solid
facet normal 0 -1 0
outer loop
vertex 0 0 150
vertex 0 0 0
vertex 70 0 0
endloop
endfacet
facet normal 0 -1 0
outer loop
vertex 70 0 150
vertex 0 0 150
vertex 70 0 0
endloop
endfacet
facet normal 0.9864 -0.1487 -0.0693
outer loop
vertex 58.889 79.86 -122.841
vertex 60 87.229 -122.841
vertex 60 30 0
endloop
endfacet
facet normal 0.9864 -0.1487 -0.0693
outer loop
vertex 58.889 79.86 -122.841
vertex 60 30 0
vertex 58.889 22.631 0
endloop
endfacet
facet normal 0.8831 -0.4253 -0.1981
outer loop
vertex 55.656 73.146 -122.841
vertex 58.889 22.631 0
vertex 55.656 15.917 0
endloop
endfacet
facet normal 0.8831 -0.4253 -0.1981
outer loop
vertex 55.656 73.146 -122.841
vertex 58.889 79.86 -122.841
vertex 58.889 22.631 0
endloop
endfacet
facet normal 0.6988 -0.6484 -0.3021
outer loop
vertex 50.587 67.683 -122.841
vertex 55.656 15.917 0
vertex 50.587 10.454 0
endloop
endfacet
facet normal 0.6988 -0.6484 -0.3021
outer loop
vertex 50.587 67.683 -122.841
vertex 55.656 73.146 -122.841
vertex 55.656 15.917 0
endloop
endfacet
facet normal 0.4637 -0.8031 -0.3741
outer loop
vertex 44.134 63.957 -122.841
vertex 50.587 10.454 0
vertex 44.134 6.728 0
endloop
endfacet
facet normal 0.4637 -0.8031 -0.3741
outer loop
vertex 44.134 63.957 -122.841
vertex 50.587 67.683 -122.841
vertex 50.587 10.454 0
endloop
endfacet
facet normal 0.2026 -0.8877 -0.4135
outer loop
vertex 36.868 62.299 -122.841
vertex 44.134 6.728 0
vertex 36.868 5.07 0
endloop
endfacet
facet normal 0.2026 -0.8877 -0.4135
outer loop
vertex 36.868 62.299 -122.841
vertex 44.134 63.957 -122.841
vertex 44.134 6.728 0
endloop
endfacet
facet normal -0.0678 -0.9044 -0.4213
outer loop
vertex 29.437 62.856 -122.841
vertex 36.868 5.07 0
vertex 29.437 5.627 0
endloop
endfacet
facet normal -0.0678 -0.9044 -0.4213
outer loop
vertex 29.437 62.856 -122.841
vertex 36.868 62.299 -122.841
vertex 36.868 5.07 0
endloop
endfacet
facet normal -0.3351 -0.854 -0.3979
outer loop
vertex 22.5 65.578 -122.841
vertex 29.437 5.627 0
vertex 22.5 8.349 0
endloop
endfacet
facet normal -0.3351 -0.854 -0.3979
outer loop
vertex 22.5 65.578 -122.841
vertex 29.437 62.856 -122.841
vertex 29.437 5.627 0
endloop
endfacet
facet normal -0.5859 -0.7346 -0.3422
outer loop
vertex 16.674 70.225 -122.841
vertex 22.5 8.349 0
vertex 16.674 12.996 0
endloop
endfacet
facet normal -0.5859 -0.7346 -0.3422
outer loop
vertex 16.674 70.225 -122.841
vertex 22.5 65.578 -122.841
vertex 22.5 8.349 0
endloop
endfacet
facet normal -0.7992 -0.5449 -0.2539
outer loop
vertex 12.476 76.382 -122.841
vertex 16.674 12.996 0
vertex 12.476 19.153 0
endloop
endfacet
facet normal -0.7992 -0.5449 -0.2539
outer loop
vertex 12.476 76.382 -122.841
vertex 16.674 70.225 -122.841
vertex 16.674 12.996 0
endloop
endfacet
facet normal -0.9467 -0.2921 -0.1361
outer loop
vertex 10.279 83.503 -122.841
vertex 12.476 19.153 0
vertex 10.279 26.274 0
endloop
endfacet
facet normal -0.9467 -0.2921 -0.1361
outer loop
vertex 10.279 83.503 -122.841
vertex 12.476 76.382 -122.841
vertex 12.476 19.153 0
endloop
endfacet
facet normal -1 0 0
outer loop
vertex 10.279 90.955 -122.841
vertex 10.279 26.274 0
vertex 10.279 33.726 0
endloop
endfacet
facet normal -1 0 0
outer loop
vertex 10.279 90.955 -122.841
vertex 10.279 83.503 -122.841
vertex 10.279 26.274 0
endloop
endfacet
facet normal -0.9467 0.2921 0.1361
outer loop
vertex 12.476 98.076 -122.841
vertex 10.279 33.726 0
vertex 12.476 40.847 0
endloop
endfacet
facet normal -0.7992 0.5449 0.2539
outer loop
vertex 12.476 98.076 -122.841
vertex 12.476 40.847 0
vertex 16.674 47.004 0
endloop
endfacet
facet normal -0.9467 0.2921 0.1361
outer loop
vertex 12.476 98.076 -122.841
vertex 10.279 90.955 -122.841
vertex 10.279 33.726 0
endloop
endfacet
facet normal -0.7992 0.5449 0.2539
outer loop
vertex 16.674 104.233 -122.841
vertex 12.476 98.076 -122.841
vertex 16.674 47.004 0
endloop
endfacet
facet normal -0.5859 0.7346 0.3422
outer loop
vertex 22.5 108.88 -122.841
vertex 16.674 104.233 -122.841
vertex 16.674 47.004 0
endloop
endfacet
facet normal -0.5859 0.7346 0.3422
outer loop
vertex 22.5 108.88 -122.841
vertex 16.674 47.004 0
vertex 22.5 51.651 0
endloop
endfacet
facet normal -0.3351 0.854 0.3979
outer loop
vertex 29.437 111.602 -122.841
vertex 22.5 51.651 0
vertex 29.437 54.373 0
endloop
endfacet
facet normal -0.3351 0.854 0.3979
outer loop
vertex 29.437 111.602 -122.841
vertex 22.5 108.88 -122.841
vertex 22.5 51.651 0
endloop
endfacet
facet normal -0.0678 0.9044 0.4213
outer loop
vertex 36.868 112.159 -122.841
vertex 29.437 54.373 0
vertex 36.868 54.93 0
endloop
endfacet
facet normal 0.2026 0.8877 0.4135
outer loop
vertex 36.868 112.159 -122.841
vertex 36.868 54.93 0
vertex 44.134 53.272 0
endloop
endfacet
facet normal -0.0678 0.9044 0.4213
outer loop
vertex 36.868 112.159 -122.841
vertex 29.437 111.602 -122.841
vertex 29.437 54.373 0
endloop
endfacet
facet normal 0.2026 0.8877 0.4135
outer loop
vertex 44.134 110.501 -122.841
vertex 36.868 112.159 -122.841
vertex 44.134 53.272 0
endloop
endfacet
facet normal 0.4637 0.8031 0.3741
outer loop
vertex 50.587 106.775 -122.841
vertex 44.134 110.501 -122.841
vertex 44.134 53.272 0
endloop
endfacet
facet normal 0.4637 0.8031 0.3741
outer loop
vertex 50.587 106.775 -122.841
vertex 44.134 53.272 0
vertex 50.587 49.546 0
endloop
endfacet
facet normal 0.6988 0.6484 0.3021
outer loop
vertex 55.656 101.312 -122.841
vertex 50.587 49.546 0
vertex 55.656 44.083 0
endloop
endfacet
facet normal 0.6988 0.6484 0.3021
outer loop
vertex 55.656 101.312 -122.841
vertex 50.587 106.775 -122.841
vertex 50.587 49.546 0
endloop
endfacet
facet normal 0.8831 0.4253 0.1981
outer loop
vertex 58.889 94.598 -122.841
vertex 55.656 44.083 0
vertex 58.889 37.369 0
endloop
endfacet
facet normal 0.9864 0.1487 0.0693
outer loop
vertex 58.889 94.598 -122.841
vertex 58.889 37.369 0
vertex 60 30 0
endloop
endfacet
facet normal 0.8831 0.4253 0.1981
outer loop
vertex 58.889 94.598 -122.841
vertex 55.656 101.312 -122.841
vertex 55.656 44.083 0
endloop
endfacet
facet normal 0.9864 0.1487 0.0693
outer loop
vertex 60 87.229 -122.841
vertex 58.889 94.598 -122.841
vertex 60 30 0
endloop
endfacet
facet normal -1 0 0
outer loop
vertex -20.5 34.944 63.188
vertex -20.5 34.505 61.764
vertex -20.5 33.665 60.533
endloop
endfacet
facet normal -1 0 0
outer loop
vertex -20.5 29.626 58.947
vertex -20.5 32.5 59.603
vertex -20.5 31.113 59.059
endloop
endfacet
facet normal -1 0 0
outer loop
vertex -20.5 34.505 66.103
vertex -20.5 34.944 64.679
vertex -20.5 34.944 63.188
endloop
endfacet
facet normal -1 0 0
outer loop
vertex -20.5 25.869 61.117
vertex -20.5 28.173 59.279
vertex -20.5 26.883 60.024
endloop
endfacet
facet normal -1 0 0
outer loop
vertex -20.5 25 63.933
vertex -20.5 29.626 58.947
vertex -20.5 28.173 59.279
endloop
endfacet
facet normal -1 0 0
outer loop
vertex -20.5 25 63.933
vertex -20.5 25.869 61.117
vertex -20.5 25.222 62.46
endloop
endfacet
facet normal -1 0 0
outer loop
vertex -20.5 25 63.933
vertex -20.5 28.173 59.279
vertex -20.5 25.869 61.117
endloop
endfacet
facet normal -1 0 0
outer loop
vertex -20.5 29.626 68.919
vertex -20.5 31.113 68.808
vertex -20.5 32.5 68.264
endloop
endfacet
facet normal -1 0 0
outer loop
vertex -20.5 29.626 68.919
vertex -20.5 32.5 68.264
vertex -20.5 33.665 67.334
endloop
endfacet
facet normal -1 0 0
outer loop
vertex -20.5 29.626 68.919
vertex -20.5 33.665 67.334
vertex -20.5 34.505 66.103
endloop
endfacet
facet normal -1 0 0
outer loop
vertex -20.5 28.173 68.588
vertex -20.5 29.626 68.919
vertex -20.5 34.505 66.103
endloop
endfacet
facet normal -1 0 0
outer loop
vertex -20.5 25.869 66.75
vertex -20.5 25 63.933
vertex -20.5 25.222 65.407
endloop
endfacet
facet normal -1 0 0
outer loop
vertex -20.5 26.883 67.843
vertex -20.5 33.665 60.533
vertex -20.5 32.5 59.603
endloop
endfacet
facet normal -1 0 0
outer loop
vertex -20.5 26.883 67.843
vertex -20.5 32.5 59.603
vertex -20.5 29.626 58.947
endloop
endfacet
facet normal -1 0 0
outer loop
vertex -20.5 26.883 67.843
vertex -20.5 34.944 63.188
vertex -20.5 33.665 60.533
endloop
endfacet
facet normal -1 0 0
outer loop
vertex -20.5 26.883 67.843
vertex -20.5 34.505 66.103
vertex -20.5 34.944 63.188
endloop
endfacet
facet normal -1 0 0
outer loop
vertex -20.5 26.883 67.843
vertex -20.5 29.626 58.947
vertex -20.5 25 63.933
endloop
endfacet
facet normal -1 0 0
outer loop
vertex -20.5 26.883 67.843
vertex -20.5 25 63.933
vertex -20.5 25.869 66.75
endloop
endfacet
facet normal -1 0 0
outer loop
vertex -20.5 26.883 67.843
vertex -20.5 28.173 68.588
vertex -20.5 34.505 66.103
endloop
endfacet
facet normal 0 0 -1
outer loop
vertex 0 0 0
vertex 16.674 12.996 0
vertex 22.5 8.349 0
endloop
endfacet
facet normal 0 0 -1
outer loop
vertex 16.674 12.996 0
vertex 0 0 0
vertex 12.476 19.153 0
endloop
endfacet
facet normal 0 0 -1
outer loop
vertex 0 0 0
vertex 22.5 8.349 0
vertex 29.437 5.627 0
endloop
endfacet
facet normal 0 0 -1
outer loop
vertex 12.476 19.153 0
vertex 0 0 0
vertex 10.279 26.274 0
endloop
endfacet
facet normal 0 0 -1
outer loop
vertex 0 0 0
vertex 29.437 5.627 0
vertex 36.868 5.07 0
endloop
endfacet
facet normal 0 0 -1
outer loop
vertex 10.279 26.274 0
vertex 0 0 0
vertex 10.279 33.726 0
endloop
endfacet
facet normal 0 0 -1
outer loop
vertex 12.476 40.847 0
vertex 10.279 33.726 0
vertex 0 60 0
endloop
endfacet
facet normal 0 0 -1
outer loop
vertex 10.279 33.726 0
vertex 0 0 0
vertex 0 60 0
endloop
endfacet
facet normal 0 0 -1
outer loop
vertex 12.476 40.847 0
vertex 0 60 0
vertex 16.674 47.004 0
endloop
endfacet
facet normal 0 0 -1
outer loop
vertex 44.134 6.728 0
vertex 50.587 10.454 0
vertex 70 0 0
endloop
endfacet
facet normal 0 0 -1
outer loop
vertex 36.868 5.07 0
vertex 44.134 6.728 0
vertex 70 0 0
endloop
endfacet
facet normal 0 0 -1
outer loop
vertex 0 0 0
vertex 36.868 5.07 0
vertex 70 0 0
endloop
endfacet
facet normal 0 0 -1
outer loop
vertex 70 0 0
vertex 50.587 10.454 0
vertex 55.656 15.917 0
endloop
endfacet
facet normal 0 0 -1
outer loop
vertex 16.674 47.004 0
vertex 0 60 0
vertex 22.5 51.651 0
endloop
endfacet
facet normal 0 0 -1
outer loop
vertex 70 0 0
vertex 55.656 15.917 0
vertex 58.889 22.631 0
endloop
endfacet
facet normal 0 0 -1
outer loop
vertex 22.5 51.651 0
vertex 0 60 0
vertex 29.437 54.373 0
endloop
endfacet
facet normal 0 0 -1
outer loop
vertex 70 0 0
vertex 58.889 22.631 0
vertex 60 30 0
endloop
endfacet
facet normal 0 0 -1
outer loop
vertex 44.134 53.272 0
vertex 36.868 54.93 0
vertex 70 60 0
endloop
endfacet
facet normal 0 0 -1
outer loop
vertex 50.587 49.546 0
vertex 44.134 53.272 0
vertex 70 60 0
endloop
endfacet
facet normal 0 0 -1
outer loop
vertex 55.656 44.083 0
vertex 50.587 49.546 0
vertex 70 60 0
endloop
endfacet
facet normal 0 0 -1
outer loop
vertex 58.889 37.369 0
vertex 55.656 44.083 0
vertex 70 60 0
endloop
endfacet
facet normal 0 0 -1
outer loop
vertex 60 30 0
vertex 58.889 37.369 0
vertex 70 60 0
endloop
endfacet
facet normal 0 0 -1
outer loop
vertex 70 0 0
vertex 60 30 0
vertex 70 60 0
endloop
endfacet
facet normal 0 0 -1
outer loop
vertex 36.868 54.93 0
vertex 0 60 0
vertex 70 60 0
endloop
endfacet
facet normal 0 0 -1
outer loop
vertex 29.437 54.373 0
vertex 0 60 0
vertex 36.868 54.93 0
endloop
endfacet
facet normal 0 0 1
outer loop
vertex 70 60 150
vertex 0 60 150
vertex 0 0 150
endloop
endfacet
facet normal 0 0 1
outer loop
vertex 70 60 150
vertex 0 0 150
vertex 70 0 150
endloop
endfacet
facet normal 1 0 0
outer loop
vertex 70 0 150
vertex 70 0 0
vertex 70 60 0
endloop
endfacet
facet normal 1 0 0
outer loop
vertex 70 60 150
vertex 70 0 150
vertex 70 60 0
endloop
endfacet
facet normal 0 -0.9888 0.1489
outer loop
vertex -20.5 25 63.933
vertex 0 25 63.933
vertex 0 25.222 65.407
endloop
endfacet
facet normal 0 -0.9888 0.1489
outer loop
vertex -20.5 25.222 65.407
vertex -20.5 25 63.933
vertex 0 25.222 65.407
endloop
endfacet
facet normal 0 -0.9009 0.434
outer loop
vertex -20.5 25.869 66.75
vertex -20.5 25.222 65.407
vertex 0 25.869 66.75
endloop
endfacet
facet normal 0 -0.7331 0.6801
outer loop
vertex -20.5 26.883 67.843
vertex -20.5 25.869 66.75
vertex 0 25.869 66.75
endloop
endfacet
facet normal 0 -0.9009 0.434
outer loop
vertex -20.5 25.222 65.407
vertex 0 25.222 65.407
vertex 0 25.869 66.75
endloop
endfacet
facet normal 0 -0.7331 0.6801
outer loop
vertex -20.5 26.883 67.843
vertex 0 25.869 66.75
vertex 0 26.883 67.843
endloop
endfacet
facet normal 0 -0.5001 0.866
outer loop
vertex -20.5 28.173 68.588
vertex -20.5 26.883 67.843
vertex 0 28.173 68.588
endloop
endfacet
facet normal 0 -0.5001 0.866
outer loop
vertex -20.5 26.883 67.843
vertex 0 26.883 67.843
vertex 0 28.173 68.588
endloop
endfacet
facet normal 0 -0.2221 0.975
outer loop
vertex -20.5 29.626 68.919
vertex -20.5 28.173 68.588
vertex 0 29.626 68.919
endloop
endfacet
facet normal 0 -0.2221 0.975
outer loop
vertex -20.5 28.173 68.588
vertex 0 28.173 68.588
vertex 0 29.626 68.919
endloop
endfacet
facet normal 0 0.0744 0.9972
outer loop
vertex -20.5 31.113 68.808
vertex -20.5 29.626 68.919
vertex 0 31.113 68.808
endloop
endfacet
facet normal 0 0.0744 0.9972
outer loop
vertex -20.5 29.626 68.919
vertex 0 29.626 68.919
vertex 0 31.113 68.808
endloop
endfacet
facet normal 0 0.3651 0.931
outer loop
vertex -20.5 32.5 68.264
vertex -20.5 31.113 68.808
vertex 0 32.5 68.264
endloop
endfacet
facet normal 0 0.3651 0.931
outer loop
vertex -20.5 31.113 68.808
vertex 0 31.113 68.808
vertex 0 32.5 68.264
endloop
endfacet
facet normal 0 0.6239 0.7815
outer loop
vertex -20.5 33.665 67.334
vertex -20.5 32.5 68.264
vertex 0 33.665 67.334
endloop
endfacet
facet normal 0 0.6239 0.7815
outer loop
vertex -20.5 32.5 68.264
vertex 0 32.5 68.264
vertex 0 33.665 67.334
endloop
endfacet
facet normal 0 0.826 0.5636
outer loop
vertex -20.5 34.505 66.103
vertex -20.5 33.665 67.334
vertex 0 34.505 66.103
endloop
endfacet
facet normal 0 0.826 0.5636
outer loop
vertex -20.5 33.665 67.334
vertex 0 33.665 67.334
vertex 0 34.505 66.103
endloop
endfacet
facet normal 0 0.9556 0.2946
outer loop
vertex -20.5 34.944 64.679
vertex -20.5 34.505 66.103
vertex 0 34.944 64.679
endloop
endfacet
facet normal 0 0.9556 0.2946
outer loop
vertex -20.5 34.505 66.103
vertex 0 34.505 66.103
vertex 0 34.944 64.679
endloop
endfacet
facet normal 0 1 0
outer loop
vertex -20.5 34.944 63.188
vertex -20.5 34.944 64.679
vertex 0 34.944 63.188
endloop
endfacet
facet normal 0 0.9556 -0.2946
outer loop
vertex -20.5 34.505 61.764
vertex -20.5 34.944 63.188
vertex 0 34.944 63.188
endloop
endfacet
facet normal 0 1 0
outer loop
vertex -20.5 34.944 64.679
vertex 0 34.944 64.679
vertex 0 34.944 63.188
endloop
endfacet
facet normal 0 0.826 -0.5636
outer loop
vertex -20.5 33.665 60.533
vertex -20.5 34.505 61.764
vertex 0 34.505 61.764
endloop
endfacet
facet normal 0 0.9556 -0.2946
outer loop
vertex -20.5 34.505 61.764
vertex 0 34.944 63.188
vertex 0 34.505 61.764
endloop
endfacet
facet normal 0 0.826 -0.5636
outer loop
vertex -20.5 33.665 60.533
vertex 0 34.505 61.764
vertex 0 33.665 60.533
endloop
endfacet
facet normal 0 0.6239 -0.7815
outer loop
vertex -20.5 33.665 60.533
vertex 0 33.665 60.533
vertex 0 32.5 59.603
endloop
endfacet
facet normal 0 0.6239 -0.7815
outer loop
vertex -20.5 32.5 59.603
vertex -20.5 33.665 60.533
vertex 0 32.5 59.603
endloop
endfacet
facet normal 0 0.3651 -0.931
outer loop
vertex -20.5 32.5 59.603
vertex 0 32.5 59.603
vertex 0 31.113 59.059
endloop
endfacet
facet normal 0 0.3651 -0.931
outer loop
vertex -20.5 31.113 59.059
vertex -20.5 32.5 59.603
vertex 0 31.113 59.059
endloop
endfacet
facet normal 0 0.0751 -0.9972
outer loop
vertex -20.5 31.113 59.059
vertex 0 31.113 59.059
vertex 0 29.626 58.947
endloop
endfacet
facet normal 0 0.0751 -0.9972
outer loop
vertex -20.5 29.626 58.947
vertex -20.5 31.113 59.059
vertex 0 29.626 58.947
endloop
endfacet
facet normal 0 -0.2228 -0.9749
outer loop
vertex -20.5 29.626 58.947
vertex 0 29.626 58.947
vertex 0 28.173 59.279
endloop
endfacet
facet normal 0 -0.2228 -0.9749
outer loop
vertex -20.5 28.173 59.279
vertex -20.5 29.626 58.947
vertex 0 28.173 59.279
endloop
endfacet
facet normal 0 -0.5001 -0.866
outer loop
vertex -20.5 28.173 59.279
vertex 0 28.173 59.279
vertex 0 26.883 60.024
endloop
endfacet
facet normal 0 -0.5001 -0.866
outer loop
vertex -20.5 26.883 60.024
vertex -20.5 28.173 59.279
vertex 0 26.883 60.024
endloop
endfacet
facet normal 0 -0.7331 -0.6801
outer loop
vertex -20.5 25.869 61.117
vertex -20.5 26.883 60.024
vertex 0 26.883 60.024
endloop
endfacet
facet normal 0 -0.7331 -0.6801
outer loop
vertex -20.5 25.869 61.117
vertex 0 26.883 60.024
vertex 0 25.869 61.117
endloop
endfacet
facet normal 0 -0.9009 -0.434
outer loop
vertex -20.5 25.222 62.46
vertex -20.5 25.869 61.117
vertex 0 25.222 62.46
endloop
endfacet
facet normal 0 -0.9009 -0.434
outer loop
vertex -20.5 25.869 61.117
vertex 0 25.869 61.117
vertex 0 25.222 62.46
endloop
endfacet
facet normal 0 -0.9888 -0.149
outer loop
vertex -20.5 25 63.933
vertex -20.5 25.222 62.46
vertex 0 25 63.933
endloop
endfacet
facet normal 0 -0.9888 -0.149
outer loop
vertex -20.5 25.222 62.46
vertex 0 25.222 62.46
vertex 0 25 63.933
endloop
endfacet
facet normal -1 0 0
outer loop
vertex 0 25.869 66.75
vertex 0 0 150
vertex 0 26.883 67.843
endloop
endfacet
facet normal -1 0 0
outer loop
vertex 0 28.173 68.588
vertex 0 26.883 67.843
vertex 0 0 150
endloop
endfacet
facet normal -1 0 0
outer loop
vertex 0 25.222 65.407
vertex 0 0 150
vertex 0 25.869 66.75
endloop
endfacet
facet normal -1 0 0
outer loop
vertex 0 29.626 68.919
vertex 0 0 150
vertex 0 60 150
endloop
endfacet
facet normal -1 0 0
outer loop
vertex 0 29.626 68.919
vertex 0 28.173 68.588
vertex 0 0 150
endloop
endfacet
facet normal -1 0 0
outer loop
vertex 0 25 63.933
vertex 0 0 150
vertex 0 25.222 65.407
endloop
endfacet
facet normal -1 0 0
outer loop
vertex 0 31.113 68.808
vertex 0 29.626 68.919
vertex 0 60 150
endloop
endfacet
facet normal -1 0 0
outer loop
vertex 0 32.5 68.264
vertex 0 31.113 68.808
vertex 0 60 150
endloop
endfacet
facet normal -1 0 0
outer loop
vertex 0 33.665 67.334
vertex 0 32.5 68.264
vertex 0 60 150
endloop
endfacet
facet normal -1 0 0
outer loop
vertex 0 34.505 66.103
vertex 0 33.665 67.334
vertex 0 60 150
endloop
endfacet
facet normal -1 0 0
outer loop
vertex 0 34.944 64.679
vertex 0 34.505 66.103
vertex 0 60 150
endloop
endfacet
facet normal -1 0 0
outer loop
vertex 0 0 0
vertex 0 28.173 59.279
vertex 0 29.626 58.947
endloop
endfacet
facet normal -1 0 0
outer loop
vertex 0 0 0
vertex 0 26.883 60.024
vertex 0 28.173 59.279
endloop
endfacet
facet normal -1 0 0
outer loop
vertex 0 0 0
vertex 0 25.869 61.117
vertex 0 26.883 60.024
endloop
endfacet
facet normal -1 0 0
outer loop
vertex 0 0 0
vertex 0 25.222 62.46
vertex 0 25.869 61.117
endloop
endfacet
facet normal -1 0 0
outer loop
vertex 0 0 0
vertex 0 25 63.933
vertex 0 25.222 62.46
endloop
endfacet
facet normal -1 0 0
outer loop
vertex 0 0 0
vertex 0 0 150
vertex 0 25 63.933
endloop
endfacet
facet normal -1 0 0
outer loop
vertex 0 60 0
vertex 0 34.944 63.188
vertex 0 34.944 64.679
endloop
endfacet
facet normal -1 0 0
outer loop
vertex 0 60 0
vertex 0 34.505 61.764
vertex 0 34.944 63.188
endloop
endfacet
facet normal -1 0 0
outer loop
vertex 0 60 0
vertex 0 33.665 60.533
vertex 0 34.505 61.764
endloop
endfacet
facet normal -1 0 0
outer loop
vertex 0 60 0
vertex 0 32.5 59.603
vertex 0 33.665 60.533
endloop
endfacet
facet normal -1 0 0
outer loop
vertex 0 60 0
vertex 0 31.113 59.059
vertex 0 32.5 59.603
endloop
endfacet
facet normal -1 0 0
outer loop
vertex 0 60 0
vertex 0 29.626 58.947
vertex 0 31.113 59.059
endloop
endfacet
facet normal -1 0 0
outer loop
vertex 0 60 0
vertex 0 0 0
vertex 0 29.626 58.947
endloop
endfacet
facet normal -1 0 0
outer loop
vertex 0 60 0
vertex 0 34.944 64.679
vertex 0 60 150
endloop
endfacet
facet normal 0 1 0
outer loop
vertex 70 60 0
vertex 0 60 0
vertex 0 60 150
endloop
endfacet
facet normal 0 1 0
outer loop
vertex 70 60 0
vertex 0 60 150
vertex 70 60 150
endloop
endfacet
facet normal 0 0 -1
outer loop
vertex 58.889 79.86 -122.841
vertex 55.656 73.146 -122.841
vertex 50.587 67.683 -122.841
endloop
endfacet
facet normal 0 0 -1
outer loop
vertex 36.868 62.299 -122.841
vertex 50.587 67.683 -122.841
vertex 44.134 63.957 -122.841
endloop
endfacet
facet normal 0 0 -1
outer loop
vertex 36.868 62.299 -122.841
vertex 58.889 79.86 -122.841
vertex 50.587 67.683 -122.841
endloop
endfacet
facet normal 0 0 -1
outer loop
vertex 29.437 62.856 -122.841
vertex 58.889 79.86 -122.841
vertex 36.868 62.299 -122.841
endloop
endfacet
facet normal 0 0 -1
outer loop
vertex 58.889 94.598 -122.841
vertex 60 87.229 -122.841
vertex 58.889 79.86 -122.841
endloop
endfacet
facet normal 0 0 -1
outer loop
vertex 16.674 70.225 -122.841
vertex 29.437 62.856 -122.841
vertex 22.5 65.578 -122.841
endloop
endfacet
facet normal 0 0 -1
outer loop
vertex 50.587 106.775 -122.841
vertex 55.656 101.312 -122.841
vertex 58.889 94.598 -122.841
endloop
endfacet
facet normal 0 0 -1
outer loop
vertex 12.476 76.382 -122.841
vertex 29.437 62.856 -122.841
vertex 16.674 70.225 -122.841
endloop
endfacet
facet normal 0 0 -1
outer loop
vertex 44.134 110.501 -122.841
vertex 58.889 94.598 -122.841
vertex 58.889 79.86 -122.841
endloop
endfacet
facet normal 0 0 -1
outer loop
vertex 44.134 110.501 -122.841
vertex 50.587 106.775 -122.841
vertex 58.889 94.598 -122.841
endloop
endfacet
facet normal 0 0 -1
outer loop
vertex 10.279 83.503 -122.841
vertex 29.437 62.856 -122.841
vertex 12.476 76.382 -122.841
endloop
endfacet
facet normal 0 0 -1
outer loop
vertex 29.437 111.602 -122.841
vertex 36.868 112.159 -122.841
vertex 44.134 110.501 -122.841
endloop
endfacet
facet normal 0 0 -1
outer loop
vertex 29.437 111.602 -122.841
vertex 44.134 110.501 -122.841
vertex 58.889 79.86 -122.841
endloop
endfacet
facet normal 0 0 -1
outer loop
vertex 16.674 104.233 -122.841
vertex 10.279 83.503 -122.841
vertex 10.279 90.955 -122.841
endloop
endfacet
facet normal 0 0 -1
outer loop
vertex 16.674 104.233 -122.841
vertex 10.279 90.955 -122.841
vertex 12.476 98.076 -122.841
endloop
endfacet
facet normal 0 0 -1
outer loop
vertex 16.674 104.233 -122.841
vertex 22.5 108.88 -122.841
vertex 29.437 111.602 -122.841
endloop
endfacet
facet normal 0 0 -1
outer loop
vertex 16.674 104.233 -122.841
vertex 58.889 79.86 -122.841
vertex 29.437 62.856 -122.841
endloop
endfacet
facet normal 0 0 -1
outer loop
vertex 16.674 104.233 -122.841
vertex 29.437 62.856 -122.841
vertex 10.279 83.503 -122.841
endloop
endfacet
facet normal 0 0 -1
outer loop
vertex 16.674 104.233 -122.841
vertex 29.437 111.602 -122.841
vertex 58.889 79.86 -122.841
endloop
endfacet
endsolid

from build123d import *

# Parameters (mm, degrees)
F0_W     = 70
F0_H     = 60
F1_DEPTH = 150
F3_R     = 25
F6_R     = 5
F7_DEPTH = 20.5


with BuildPart() as f1:
    # F0 (on Top) → F1 (new body)
    with BuildSketch(Plane.XY):
        with Locations((35, 30)):
            Rectangle(F0_W, F0_H)
    extrude(amount=F1_DEPTH)

    # F5: sweep along a path in F4
    with BuildLine(Plane.YZ.offset(35)) as f5_path:
        Line((29.8517439514, 0), (87.0807096362, -122.8410974145))
    # F3 (on face) → F5 (sweep)
    with BuildSketch(Plane(origin=(0, 0, 0), x_dir=(1, 0, 0), z_dir=(0, 0, -1))):
        with Locations((35, -30)):
            Circle(F3_R)
    sweep(path=f5_path.line)

    # F6 (on face) → F7 (join)
    with BuildSketch(Plane(origin=(0, 0, 0), x_dir=(0, -1, 0), z_dir=(-1, 0, 0))):
        with Locations((-30, 63.9334544539)):
            Circle(F6_R)
    extrude(amount=F7_DEPTH)


solid = f1.part
